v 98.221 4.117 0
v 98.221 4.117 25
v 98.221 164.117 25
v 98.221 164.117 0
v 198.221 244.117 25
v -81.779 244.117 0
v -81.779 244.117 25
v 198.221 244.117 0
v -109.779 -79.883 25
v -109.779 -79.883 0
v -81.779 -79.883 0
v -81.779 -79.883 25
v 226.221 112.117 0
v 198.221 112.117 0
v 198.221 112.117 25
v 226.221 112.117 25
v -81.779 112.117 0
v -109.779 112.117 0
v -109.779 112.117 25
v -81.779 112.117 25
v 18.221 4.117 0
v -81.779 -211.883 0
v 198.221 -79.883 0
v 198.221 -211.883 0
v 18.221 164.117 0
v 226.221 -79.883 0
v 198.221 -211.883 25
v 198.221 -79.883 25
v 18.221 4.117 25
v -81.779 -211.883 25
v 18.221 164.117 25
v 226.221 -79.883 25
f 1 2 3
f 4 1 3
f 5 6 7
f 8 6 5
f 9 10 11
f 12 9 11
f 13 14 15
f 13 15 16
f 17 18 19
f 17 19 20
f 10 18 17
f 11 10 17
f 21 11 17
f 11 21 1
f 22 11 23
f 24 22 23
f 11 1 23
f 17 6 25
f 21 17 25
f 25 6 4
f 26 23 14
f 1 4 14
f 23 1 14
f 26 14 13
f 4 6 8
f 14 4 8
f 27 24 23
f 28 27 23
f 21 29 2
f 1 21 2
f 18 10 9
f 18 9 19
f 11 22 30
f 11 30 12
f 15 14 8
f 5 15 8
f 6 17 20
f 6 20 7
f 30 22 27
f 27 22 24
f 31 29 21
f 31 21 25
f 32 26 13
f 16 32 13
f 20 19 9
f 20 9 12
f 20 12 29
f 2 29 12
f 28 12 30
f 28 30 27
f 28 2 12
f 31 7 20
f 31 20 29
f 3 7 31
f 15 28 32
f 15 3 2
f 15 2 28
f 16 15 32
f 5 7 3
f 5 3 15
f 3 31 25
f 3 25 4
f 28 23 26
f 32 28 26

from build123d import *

# Parameters (mm, degrees)
SKETCH1_W           = 336
SKETCH1_H           = 456
BOSS_EXTRUDE1_DEPTH = 25
SKETCH3_W           = 28
SKETCH3_H           = 132
CUT_EXTRUDE1_DEPTH  = 25
SKETCH4_W           = 80
SKETCH4_H           = 160
CUT_EXTRUDE2_DEPTH  = 25


with BuildPart() as part:
    # Sketch1 → Boss-Extrude1 (new body)
    with BuildSketch(Plane.XY):
        with Locations((58.220689655, 16.117241379)):
            Rectangle(SKETCH1_W, SKETCH1_H)
    extrude(amount=BOSS_EXTRUDE1_DEPTH)

    # Sketch3 → Cut-Extrude1 (cut)
    with BuildSketch(Plane.XY):
        with Locations((-95.779310345, 178.117241379)):
            Rectangle(SKETCH3_W, SKETCH3_H)
        with Locations((212.220689655, 178.117241379)):
            Rectangle(SKETCH3_W, SKETCH3_H)
        with Locations((212.220689655, -145.882758621)):
            Rectangle(SKETCH3_W, SKETCH3_H)
        with Locations((-95.779310345, -145.882758621)):
            Rectangle(SKETCH3_W, SKETCH3_H)
    extrude(amount=CUT_EXTRUDE1_DEPTH, mode=Mode.SUBTRACT)

    # Sketch4 → Cut-Extrude2 (cut)
    with BuildSketch(Plane.XY.offset(25)):
        with Locations((58.220689655, 84.117241379)):
            Rectangle(SKETCH4_W, SKETCH4_H)
    extrude(amount=-CUT_EXTRUDE2_DEPTH, mode=Mode.SUBTRACT)


solid = part.part
